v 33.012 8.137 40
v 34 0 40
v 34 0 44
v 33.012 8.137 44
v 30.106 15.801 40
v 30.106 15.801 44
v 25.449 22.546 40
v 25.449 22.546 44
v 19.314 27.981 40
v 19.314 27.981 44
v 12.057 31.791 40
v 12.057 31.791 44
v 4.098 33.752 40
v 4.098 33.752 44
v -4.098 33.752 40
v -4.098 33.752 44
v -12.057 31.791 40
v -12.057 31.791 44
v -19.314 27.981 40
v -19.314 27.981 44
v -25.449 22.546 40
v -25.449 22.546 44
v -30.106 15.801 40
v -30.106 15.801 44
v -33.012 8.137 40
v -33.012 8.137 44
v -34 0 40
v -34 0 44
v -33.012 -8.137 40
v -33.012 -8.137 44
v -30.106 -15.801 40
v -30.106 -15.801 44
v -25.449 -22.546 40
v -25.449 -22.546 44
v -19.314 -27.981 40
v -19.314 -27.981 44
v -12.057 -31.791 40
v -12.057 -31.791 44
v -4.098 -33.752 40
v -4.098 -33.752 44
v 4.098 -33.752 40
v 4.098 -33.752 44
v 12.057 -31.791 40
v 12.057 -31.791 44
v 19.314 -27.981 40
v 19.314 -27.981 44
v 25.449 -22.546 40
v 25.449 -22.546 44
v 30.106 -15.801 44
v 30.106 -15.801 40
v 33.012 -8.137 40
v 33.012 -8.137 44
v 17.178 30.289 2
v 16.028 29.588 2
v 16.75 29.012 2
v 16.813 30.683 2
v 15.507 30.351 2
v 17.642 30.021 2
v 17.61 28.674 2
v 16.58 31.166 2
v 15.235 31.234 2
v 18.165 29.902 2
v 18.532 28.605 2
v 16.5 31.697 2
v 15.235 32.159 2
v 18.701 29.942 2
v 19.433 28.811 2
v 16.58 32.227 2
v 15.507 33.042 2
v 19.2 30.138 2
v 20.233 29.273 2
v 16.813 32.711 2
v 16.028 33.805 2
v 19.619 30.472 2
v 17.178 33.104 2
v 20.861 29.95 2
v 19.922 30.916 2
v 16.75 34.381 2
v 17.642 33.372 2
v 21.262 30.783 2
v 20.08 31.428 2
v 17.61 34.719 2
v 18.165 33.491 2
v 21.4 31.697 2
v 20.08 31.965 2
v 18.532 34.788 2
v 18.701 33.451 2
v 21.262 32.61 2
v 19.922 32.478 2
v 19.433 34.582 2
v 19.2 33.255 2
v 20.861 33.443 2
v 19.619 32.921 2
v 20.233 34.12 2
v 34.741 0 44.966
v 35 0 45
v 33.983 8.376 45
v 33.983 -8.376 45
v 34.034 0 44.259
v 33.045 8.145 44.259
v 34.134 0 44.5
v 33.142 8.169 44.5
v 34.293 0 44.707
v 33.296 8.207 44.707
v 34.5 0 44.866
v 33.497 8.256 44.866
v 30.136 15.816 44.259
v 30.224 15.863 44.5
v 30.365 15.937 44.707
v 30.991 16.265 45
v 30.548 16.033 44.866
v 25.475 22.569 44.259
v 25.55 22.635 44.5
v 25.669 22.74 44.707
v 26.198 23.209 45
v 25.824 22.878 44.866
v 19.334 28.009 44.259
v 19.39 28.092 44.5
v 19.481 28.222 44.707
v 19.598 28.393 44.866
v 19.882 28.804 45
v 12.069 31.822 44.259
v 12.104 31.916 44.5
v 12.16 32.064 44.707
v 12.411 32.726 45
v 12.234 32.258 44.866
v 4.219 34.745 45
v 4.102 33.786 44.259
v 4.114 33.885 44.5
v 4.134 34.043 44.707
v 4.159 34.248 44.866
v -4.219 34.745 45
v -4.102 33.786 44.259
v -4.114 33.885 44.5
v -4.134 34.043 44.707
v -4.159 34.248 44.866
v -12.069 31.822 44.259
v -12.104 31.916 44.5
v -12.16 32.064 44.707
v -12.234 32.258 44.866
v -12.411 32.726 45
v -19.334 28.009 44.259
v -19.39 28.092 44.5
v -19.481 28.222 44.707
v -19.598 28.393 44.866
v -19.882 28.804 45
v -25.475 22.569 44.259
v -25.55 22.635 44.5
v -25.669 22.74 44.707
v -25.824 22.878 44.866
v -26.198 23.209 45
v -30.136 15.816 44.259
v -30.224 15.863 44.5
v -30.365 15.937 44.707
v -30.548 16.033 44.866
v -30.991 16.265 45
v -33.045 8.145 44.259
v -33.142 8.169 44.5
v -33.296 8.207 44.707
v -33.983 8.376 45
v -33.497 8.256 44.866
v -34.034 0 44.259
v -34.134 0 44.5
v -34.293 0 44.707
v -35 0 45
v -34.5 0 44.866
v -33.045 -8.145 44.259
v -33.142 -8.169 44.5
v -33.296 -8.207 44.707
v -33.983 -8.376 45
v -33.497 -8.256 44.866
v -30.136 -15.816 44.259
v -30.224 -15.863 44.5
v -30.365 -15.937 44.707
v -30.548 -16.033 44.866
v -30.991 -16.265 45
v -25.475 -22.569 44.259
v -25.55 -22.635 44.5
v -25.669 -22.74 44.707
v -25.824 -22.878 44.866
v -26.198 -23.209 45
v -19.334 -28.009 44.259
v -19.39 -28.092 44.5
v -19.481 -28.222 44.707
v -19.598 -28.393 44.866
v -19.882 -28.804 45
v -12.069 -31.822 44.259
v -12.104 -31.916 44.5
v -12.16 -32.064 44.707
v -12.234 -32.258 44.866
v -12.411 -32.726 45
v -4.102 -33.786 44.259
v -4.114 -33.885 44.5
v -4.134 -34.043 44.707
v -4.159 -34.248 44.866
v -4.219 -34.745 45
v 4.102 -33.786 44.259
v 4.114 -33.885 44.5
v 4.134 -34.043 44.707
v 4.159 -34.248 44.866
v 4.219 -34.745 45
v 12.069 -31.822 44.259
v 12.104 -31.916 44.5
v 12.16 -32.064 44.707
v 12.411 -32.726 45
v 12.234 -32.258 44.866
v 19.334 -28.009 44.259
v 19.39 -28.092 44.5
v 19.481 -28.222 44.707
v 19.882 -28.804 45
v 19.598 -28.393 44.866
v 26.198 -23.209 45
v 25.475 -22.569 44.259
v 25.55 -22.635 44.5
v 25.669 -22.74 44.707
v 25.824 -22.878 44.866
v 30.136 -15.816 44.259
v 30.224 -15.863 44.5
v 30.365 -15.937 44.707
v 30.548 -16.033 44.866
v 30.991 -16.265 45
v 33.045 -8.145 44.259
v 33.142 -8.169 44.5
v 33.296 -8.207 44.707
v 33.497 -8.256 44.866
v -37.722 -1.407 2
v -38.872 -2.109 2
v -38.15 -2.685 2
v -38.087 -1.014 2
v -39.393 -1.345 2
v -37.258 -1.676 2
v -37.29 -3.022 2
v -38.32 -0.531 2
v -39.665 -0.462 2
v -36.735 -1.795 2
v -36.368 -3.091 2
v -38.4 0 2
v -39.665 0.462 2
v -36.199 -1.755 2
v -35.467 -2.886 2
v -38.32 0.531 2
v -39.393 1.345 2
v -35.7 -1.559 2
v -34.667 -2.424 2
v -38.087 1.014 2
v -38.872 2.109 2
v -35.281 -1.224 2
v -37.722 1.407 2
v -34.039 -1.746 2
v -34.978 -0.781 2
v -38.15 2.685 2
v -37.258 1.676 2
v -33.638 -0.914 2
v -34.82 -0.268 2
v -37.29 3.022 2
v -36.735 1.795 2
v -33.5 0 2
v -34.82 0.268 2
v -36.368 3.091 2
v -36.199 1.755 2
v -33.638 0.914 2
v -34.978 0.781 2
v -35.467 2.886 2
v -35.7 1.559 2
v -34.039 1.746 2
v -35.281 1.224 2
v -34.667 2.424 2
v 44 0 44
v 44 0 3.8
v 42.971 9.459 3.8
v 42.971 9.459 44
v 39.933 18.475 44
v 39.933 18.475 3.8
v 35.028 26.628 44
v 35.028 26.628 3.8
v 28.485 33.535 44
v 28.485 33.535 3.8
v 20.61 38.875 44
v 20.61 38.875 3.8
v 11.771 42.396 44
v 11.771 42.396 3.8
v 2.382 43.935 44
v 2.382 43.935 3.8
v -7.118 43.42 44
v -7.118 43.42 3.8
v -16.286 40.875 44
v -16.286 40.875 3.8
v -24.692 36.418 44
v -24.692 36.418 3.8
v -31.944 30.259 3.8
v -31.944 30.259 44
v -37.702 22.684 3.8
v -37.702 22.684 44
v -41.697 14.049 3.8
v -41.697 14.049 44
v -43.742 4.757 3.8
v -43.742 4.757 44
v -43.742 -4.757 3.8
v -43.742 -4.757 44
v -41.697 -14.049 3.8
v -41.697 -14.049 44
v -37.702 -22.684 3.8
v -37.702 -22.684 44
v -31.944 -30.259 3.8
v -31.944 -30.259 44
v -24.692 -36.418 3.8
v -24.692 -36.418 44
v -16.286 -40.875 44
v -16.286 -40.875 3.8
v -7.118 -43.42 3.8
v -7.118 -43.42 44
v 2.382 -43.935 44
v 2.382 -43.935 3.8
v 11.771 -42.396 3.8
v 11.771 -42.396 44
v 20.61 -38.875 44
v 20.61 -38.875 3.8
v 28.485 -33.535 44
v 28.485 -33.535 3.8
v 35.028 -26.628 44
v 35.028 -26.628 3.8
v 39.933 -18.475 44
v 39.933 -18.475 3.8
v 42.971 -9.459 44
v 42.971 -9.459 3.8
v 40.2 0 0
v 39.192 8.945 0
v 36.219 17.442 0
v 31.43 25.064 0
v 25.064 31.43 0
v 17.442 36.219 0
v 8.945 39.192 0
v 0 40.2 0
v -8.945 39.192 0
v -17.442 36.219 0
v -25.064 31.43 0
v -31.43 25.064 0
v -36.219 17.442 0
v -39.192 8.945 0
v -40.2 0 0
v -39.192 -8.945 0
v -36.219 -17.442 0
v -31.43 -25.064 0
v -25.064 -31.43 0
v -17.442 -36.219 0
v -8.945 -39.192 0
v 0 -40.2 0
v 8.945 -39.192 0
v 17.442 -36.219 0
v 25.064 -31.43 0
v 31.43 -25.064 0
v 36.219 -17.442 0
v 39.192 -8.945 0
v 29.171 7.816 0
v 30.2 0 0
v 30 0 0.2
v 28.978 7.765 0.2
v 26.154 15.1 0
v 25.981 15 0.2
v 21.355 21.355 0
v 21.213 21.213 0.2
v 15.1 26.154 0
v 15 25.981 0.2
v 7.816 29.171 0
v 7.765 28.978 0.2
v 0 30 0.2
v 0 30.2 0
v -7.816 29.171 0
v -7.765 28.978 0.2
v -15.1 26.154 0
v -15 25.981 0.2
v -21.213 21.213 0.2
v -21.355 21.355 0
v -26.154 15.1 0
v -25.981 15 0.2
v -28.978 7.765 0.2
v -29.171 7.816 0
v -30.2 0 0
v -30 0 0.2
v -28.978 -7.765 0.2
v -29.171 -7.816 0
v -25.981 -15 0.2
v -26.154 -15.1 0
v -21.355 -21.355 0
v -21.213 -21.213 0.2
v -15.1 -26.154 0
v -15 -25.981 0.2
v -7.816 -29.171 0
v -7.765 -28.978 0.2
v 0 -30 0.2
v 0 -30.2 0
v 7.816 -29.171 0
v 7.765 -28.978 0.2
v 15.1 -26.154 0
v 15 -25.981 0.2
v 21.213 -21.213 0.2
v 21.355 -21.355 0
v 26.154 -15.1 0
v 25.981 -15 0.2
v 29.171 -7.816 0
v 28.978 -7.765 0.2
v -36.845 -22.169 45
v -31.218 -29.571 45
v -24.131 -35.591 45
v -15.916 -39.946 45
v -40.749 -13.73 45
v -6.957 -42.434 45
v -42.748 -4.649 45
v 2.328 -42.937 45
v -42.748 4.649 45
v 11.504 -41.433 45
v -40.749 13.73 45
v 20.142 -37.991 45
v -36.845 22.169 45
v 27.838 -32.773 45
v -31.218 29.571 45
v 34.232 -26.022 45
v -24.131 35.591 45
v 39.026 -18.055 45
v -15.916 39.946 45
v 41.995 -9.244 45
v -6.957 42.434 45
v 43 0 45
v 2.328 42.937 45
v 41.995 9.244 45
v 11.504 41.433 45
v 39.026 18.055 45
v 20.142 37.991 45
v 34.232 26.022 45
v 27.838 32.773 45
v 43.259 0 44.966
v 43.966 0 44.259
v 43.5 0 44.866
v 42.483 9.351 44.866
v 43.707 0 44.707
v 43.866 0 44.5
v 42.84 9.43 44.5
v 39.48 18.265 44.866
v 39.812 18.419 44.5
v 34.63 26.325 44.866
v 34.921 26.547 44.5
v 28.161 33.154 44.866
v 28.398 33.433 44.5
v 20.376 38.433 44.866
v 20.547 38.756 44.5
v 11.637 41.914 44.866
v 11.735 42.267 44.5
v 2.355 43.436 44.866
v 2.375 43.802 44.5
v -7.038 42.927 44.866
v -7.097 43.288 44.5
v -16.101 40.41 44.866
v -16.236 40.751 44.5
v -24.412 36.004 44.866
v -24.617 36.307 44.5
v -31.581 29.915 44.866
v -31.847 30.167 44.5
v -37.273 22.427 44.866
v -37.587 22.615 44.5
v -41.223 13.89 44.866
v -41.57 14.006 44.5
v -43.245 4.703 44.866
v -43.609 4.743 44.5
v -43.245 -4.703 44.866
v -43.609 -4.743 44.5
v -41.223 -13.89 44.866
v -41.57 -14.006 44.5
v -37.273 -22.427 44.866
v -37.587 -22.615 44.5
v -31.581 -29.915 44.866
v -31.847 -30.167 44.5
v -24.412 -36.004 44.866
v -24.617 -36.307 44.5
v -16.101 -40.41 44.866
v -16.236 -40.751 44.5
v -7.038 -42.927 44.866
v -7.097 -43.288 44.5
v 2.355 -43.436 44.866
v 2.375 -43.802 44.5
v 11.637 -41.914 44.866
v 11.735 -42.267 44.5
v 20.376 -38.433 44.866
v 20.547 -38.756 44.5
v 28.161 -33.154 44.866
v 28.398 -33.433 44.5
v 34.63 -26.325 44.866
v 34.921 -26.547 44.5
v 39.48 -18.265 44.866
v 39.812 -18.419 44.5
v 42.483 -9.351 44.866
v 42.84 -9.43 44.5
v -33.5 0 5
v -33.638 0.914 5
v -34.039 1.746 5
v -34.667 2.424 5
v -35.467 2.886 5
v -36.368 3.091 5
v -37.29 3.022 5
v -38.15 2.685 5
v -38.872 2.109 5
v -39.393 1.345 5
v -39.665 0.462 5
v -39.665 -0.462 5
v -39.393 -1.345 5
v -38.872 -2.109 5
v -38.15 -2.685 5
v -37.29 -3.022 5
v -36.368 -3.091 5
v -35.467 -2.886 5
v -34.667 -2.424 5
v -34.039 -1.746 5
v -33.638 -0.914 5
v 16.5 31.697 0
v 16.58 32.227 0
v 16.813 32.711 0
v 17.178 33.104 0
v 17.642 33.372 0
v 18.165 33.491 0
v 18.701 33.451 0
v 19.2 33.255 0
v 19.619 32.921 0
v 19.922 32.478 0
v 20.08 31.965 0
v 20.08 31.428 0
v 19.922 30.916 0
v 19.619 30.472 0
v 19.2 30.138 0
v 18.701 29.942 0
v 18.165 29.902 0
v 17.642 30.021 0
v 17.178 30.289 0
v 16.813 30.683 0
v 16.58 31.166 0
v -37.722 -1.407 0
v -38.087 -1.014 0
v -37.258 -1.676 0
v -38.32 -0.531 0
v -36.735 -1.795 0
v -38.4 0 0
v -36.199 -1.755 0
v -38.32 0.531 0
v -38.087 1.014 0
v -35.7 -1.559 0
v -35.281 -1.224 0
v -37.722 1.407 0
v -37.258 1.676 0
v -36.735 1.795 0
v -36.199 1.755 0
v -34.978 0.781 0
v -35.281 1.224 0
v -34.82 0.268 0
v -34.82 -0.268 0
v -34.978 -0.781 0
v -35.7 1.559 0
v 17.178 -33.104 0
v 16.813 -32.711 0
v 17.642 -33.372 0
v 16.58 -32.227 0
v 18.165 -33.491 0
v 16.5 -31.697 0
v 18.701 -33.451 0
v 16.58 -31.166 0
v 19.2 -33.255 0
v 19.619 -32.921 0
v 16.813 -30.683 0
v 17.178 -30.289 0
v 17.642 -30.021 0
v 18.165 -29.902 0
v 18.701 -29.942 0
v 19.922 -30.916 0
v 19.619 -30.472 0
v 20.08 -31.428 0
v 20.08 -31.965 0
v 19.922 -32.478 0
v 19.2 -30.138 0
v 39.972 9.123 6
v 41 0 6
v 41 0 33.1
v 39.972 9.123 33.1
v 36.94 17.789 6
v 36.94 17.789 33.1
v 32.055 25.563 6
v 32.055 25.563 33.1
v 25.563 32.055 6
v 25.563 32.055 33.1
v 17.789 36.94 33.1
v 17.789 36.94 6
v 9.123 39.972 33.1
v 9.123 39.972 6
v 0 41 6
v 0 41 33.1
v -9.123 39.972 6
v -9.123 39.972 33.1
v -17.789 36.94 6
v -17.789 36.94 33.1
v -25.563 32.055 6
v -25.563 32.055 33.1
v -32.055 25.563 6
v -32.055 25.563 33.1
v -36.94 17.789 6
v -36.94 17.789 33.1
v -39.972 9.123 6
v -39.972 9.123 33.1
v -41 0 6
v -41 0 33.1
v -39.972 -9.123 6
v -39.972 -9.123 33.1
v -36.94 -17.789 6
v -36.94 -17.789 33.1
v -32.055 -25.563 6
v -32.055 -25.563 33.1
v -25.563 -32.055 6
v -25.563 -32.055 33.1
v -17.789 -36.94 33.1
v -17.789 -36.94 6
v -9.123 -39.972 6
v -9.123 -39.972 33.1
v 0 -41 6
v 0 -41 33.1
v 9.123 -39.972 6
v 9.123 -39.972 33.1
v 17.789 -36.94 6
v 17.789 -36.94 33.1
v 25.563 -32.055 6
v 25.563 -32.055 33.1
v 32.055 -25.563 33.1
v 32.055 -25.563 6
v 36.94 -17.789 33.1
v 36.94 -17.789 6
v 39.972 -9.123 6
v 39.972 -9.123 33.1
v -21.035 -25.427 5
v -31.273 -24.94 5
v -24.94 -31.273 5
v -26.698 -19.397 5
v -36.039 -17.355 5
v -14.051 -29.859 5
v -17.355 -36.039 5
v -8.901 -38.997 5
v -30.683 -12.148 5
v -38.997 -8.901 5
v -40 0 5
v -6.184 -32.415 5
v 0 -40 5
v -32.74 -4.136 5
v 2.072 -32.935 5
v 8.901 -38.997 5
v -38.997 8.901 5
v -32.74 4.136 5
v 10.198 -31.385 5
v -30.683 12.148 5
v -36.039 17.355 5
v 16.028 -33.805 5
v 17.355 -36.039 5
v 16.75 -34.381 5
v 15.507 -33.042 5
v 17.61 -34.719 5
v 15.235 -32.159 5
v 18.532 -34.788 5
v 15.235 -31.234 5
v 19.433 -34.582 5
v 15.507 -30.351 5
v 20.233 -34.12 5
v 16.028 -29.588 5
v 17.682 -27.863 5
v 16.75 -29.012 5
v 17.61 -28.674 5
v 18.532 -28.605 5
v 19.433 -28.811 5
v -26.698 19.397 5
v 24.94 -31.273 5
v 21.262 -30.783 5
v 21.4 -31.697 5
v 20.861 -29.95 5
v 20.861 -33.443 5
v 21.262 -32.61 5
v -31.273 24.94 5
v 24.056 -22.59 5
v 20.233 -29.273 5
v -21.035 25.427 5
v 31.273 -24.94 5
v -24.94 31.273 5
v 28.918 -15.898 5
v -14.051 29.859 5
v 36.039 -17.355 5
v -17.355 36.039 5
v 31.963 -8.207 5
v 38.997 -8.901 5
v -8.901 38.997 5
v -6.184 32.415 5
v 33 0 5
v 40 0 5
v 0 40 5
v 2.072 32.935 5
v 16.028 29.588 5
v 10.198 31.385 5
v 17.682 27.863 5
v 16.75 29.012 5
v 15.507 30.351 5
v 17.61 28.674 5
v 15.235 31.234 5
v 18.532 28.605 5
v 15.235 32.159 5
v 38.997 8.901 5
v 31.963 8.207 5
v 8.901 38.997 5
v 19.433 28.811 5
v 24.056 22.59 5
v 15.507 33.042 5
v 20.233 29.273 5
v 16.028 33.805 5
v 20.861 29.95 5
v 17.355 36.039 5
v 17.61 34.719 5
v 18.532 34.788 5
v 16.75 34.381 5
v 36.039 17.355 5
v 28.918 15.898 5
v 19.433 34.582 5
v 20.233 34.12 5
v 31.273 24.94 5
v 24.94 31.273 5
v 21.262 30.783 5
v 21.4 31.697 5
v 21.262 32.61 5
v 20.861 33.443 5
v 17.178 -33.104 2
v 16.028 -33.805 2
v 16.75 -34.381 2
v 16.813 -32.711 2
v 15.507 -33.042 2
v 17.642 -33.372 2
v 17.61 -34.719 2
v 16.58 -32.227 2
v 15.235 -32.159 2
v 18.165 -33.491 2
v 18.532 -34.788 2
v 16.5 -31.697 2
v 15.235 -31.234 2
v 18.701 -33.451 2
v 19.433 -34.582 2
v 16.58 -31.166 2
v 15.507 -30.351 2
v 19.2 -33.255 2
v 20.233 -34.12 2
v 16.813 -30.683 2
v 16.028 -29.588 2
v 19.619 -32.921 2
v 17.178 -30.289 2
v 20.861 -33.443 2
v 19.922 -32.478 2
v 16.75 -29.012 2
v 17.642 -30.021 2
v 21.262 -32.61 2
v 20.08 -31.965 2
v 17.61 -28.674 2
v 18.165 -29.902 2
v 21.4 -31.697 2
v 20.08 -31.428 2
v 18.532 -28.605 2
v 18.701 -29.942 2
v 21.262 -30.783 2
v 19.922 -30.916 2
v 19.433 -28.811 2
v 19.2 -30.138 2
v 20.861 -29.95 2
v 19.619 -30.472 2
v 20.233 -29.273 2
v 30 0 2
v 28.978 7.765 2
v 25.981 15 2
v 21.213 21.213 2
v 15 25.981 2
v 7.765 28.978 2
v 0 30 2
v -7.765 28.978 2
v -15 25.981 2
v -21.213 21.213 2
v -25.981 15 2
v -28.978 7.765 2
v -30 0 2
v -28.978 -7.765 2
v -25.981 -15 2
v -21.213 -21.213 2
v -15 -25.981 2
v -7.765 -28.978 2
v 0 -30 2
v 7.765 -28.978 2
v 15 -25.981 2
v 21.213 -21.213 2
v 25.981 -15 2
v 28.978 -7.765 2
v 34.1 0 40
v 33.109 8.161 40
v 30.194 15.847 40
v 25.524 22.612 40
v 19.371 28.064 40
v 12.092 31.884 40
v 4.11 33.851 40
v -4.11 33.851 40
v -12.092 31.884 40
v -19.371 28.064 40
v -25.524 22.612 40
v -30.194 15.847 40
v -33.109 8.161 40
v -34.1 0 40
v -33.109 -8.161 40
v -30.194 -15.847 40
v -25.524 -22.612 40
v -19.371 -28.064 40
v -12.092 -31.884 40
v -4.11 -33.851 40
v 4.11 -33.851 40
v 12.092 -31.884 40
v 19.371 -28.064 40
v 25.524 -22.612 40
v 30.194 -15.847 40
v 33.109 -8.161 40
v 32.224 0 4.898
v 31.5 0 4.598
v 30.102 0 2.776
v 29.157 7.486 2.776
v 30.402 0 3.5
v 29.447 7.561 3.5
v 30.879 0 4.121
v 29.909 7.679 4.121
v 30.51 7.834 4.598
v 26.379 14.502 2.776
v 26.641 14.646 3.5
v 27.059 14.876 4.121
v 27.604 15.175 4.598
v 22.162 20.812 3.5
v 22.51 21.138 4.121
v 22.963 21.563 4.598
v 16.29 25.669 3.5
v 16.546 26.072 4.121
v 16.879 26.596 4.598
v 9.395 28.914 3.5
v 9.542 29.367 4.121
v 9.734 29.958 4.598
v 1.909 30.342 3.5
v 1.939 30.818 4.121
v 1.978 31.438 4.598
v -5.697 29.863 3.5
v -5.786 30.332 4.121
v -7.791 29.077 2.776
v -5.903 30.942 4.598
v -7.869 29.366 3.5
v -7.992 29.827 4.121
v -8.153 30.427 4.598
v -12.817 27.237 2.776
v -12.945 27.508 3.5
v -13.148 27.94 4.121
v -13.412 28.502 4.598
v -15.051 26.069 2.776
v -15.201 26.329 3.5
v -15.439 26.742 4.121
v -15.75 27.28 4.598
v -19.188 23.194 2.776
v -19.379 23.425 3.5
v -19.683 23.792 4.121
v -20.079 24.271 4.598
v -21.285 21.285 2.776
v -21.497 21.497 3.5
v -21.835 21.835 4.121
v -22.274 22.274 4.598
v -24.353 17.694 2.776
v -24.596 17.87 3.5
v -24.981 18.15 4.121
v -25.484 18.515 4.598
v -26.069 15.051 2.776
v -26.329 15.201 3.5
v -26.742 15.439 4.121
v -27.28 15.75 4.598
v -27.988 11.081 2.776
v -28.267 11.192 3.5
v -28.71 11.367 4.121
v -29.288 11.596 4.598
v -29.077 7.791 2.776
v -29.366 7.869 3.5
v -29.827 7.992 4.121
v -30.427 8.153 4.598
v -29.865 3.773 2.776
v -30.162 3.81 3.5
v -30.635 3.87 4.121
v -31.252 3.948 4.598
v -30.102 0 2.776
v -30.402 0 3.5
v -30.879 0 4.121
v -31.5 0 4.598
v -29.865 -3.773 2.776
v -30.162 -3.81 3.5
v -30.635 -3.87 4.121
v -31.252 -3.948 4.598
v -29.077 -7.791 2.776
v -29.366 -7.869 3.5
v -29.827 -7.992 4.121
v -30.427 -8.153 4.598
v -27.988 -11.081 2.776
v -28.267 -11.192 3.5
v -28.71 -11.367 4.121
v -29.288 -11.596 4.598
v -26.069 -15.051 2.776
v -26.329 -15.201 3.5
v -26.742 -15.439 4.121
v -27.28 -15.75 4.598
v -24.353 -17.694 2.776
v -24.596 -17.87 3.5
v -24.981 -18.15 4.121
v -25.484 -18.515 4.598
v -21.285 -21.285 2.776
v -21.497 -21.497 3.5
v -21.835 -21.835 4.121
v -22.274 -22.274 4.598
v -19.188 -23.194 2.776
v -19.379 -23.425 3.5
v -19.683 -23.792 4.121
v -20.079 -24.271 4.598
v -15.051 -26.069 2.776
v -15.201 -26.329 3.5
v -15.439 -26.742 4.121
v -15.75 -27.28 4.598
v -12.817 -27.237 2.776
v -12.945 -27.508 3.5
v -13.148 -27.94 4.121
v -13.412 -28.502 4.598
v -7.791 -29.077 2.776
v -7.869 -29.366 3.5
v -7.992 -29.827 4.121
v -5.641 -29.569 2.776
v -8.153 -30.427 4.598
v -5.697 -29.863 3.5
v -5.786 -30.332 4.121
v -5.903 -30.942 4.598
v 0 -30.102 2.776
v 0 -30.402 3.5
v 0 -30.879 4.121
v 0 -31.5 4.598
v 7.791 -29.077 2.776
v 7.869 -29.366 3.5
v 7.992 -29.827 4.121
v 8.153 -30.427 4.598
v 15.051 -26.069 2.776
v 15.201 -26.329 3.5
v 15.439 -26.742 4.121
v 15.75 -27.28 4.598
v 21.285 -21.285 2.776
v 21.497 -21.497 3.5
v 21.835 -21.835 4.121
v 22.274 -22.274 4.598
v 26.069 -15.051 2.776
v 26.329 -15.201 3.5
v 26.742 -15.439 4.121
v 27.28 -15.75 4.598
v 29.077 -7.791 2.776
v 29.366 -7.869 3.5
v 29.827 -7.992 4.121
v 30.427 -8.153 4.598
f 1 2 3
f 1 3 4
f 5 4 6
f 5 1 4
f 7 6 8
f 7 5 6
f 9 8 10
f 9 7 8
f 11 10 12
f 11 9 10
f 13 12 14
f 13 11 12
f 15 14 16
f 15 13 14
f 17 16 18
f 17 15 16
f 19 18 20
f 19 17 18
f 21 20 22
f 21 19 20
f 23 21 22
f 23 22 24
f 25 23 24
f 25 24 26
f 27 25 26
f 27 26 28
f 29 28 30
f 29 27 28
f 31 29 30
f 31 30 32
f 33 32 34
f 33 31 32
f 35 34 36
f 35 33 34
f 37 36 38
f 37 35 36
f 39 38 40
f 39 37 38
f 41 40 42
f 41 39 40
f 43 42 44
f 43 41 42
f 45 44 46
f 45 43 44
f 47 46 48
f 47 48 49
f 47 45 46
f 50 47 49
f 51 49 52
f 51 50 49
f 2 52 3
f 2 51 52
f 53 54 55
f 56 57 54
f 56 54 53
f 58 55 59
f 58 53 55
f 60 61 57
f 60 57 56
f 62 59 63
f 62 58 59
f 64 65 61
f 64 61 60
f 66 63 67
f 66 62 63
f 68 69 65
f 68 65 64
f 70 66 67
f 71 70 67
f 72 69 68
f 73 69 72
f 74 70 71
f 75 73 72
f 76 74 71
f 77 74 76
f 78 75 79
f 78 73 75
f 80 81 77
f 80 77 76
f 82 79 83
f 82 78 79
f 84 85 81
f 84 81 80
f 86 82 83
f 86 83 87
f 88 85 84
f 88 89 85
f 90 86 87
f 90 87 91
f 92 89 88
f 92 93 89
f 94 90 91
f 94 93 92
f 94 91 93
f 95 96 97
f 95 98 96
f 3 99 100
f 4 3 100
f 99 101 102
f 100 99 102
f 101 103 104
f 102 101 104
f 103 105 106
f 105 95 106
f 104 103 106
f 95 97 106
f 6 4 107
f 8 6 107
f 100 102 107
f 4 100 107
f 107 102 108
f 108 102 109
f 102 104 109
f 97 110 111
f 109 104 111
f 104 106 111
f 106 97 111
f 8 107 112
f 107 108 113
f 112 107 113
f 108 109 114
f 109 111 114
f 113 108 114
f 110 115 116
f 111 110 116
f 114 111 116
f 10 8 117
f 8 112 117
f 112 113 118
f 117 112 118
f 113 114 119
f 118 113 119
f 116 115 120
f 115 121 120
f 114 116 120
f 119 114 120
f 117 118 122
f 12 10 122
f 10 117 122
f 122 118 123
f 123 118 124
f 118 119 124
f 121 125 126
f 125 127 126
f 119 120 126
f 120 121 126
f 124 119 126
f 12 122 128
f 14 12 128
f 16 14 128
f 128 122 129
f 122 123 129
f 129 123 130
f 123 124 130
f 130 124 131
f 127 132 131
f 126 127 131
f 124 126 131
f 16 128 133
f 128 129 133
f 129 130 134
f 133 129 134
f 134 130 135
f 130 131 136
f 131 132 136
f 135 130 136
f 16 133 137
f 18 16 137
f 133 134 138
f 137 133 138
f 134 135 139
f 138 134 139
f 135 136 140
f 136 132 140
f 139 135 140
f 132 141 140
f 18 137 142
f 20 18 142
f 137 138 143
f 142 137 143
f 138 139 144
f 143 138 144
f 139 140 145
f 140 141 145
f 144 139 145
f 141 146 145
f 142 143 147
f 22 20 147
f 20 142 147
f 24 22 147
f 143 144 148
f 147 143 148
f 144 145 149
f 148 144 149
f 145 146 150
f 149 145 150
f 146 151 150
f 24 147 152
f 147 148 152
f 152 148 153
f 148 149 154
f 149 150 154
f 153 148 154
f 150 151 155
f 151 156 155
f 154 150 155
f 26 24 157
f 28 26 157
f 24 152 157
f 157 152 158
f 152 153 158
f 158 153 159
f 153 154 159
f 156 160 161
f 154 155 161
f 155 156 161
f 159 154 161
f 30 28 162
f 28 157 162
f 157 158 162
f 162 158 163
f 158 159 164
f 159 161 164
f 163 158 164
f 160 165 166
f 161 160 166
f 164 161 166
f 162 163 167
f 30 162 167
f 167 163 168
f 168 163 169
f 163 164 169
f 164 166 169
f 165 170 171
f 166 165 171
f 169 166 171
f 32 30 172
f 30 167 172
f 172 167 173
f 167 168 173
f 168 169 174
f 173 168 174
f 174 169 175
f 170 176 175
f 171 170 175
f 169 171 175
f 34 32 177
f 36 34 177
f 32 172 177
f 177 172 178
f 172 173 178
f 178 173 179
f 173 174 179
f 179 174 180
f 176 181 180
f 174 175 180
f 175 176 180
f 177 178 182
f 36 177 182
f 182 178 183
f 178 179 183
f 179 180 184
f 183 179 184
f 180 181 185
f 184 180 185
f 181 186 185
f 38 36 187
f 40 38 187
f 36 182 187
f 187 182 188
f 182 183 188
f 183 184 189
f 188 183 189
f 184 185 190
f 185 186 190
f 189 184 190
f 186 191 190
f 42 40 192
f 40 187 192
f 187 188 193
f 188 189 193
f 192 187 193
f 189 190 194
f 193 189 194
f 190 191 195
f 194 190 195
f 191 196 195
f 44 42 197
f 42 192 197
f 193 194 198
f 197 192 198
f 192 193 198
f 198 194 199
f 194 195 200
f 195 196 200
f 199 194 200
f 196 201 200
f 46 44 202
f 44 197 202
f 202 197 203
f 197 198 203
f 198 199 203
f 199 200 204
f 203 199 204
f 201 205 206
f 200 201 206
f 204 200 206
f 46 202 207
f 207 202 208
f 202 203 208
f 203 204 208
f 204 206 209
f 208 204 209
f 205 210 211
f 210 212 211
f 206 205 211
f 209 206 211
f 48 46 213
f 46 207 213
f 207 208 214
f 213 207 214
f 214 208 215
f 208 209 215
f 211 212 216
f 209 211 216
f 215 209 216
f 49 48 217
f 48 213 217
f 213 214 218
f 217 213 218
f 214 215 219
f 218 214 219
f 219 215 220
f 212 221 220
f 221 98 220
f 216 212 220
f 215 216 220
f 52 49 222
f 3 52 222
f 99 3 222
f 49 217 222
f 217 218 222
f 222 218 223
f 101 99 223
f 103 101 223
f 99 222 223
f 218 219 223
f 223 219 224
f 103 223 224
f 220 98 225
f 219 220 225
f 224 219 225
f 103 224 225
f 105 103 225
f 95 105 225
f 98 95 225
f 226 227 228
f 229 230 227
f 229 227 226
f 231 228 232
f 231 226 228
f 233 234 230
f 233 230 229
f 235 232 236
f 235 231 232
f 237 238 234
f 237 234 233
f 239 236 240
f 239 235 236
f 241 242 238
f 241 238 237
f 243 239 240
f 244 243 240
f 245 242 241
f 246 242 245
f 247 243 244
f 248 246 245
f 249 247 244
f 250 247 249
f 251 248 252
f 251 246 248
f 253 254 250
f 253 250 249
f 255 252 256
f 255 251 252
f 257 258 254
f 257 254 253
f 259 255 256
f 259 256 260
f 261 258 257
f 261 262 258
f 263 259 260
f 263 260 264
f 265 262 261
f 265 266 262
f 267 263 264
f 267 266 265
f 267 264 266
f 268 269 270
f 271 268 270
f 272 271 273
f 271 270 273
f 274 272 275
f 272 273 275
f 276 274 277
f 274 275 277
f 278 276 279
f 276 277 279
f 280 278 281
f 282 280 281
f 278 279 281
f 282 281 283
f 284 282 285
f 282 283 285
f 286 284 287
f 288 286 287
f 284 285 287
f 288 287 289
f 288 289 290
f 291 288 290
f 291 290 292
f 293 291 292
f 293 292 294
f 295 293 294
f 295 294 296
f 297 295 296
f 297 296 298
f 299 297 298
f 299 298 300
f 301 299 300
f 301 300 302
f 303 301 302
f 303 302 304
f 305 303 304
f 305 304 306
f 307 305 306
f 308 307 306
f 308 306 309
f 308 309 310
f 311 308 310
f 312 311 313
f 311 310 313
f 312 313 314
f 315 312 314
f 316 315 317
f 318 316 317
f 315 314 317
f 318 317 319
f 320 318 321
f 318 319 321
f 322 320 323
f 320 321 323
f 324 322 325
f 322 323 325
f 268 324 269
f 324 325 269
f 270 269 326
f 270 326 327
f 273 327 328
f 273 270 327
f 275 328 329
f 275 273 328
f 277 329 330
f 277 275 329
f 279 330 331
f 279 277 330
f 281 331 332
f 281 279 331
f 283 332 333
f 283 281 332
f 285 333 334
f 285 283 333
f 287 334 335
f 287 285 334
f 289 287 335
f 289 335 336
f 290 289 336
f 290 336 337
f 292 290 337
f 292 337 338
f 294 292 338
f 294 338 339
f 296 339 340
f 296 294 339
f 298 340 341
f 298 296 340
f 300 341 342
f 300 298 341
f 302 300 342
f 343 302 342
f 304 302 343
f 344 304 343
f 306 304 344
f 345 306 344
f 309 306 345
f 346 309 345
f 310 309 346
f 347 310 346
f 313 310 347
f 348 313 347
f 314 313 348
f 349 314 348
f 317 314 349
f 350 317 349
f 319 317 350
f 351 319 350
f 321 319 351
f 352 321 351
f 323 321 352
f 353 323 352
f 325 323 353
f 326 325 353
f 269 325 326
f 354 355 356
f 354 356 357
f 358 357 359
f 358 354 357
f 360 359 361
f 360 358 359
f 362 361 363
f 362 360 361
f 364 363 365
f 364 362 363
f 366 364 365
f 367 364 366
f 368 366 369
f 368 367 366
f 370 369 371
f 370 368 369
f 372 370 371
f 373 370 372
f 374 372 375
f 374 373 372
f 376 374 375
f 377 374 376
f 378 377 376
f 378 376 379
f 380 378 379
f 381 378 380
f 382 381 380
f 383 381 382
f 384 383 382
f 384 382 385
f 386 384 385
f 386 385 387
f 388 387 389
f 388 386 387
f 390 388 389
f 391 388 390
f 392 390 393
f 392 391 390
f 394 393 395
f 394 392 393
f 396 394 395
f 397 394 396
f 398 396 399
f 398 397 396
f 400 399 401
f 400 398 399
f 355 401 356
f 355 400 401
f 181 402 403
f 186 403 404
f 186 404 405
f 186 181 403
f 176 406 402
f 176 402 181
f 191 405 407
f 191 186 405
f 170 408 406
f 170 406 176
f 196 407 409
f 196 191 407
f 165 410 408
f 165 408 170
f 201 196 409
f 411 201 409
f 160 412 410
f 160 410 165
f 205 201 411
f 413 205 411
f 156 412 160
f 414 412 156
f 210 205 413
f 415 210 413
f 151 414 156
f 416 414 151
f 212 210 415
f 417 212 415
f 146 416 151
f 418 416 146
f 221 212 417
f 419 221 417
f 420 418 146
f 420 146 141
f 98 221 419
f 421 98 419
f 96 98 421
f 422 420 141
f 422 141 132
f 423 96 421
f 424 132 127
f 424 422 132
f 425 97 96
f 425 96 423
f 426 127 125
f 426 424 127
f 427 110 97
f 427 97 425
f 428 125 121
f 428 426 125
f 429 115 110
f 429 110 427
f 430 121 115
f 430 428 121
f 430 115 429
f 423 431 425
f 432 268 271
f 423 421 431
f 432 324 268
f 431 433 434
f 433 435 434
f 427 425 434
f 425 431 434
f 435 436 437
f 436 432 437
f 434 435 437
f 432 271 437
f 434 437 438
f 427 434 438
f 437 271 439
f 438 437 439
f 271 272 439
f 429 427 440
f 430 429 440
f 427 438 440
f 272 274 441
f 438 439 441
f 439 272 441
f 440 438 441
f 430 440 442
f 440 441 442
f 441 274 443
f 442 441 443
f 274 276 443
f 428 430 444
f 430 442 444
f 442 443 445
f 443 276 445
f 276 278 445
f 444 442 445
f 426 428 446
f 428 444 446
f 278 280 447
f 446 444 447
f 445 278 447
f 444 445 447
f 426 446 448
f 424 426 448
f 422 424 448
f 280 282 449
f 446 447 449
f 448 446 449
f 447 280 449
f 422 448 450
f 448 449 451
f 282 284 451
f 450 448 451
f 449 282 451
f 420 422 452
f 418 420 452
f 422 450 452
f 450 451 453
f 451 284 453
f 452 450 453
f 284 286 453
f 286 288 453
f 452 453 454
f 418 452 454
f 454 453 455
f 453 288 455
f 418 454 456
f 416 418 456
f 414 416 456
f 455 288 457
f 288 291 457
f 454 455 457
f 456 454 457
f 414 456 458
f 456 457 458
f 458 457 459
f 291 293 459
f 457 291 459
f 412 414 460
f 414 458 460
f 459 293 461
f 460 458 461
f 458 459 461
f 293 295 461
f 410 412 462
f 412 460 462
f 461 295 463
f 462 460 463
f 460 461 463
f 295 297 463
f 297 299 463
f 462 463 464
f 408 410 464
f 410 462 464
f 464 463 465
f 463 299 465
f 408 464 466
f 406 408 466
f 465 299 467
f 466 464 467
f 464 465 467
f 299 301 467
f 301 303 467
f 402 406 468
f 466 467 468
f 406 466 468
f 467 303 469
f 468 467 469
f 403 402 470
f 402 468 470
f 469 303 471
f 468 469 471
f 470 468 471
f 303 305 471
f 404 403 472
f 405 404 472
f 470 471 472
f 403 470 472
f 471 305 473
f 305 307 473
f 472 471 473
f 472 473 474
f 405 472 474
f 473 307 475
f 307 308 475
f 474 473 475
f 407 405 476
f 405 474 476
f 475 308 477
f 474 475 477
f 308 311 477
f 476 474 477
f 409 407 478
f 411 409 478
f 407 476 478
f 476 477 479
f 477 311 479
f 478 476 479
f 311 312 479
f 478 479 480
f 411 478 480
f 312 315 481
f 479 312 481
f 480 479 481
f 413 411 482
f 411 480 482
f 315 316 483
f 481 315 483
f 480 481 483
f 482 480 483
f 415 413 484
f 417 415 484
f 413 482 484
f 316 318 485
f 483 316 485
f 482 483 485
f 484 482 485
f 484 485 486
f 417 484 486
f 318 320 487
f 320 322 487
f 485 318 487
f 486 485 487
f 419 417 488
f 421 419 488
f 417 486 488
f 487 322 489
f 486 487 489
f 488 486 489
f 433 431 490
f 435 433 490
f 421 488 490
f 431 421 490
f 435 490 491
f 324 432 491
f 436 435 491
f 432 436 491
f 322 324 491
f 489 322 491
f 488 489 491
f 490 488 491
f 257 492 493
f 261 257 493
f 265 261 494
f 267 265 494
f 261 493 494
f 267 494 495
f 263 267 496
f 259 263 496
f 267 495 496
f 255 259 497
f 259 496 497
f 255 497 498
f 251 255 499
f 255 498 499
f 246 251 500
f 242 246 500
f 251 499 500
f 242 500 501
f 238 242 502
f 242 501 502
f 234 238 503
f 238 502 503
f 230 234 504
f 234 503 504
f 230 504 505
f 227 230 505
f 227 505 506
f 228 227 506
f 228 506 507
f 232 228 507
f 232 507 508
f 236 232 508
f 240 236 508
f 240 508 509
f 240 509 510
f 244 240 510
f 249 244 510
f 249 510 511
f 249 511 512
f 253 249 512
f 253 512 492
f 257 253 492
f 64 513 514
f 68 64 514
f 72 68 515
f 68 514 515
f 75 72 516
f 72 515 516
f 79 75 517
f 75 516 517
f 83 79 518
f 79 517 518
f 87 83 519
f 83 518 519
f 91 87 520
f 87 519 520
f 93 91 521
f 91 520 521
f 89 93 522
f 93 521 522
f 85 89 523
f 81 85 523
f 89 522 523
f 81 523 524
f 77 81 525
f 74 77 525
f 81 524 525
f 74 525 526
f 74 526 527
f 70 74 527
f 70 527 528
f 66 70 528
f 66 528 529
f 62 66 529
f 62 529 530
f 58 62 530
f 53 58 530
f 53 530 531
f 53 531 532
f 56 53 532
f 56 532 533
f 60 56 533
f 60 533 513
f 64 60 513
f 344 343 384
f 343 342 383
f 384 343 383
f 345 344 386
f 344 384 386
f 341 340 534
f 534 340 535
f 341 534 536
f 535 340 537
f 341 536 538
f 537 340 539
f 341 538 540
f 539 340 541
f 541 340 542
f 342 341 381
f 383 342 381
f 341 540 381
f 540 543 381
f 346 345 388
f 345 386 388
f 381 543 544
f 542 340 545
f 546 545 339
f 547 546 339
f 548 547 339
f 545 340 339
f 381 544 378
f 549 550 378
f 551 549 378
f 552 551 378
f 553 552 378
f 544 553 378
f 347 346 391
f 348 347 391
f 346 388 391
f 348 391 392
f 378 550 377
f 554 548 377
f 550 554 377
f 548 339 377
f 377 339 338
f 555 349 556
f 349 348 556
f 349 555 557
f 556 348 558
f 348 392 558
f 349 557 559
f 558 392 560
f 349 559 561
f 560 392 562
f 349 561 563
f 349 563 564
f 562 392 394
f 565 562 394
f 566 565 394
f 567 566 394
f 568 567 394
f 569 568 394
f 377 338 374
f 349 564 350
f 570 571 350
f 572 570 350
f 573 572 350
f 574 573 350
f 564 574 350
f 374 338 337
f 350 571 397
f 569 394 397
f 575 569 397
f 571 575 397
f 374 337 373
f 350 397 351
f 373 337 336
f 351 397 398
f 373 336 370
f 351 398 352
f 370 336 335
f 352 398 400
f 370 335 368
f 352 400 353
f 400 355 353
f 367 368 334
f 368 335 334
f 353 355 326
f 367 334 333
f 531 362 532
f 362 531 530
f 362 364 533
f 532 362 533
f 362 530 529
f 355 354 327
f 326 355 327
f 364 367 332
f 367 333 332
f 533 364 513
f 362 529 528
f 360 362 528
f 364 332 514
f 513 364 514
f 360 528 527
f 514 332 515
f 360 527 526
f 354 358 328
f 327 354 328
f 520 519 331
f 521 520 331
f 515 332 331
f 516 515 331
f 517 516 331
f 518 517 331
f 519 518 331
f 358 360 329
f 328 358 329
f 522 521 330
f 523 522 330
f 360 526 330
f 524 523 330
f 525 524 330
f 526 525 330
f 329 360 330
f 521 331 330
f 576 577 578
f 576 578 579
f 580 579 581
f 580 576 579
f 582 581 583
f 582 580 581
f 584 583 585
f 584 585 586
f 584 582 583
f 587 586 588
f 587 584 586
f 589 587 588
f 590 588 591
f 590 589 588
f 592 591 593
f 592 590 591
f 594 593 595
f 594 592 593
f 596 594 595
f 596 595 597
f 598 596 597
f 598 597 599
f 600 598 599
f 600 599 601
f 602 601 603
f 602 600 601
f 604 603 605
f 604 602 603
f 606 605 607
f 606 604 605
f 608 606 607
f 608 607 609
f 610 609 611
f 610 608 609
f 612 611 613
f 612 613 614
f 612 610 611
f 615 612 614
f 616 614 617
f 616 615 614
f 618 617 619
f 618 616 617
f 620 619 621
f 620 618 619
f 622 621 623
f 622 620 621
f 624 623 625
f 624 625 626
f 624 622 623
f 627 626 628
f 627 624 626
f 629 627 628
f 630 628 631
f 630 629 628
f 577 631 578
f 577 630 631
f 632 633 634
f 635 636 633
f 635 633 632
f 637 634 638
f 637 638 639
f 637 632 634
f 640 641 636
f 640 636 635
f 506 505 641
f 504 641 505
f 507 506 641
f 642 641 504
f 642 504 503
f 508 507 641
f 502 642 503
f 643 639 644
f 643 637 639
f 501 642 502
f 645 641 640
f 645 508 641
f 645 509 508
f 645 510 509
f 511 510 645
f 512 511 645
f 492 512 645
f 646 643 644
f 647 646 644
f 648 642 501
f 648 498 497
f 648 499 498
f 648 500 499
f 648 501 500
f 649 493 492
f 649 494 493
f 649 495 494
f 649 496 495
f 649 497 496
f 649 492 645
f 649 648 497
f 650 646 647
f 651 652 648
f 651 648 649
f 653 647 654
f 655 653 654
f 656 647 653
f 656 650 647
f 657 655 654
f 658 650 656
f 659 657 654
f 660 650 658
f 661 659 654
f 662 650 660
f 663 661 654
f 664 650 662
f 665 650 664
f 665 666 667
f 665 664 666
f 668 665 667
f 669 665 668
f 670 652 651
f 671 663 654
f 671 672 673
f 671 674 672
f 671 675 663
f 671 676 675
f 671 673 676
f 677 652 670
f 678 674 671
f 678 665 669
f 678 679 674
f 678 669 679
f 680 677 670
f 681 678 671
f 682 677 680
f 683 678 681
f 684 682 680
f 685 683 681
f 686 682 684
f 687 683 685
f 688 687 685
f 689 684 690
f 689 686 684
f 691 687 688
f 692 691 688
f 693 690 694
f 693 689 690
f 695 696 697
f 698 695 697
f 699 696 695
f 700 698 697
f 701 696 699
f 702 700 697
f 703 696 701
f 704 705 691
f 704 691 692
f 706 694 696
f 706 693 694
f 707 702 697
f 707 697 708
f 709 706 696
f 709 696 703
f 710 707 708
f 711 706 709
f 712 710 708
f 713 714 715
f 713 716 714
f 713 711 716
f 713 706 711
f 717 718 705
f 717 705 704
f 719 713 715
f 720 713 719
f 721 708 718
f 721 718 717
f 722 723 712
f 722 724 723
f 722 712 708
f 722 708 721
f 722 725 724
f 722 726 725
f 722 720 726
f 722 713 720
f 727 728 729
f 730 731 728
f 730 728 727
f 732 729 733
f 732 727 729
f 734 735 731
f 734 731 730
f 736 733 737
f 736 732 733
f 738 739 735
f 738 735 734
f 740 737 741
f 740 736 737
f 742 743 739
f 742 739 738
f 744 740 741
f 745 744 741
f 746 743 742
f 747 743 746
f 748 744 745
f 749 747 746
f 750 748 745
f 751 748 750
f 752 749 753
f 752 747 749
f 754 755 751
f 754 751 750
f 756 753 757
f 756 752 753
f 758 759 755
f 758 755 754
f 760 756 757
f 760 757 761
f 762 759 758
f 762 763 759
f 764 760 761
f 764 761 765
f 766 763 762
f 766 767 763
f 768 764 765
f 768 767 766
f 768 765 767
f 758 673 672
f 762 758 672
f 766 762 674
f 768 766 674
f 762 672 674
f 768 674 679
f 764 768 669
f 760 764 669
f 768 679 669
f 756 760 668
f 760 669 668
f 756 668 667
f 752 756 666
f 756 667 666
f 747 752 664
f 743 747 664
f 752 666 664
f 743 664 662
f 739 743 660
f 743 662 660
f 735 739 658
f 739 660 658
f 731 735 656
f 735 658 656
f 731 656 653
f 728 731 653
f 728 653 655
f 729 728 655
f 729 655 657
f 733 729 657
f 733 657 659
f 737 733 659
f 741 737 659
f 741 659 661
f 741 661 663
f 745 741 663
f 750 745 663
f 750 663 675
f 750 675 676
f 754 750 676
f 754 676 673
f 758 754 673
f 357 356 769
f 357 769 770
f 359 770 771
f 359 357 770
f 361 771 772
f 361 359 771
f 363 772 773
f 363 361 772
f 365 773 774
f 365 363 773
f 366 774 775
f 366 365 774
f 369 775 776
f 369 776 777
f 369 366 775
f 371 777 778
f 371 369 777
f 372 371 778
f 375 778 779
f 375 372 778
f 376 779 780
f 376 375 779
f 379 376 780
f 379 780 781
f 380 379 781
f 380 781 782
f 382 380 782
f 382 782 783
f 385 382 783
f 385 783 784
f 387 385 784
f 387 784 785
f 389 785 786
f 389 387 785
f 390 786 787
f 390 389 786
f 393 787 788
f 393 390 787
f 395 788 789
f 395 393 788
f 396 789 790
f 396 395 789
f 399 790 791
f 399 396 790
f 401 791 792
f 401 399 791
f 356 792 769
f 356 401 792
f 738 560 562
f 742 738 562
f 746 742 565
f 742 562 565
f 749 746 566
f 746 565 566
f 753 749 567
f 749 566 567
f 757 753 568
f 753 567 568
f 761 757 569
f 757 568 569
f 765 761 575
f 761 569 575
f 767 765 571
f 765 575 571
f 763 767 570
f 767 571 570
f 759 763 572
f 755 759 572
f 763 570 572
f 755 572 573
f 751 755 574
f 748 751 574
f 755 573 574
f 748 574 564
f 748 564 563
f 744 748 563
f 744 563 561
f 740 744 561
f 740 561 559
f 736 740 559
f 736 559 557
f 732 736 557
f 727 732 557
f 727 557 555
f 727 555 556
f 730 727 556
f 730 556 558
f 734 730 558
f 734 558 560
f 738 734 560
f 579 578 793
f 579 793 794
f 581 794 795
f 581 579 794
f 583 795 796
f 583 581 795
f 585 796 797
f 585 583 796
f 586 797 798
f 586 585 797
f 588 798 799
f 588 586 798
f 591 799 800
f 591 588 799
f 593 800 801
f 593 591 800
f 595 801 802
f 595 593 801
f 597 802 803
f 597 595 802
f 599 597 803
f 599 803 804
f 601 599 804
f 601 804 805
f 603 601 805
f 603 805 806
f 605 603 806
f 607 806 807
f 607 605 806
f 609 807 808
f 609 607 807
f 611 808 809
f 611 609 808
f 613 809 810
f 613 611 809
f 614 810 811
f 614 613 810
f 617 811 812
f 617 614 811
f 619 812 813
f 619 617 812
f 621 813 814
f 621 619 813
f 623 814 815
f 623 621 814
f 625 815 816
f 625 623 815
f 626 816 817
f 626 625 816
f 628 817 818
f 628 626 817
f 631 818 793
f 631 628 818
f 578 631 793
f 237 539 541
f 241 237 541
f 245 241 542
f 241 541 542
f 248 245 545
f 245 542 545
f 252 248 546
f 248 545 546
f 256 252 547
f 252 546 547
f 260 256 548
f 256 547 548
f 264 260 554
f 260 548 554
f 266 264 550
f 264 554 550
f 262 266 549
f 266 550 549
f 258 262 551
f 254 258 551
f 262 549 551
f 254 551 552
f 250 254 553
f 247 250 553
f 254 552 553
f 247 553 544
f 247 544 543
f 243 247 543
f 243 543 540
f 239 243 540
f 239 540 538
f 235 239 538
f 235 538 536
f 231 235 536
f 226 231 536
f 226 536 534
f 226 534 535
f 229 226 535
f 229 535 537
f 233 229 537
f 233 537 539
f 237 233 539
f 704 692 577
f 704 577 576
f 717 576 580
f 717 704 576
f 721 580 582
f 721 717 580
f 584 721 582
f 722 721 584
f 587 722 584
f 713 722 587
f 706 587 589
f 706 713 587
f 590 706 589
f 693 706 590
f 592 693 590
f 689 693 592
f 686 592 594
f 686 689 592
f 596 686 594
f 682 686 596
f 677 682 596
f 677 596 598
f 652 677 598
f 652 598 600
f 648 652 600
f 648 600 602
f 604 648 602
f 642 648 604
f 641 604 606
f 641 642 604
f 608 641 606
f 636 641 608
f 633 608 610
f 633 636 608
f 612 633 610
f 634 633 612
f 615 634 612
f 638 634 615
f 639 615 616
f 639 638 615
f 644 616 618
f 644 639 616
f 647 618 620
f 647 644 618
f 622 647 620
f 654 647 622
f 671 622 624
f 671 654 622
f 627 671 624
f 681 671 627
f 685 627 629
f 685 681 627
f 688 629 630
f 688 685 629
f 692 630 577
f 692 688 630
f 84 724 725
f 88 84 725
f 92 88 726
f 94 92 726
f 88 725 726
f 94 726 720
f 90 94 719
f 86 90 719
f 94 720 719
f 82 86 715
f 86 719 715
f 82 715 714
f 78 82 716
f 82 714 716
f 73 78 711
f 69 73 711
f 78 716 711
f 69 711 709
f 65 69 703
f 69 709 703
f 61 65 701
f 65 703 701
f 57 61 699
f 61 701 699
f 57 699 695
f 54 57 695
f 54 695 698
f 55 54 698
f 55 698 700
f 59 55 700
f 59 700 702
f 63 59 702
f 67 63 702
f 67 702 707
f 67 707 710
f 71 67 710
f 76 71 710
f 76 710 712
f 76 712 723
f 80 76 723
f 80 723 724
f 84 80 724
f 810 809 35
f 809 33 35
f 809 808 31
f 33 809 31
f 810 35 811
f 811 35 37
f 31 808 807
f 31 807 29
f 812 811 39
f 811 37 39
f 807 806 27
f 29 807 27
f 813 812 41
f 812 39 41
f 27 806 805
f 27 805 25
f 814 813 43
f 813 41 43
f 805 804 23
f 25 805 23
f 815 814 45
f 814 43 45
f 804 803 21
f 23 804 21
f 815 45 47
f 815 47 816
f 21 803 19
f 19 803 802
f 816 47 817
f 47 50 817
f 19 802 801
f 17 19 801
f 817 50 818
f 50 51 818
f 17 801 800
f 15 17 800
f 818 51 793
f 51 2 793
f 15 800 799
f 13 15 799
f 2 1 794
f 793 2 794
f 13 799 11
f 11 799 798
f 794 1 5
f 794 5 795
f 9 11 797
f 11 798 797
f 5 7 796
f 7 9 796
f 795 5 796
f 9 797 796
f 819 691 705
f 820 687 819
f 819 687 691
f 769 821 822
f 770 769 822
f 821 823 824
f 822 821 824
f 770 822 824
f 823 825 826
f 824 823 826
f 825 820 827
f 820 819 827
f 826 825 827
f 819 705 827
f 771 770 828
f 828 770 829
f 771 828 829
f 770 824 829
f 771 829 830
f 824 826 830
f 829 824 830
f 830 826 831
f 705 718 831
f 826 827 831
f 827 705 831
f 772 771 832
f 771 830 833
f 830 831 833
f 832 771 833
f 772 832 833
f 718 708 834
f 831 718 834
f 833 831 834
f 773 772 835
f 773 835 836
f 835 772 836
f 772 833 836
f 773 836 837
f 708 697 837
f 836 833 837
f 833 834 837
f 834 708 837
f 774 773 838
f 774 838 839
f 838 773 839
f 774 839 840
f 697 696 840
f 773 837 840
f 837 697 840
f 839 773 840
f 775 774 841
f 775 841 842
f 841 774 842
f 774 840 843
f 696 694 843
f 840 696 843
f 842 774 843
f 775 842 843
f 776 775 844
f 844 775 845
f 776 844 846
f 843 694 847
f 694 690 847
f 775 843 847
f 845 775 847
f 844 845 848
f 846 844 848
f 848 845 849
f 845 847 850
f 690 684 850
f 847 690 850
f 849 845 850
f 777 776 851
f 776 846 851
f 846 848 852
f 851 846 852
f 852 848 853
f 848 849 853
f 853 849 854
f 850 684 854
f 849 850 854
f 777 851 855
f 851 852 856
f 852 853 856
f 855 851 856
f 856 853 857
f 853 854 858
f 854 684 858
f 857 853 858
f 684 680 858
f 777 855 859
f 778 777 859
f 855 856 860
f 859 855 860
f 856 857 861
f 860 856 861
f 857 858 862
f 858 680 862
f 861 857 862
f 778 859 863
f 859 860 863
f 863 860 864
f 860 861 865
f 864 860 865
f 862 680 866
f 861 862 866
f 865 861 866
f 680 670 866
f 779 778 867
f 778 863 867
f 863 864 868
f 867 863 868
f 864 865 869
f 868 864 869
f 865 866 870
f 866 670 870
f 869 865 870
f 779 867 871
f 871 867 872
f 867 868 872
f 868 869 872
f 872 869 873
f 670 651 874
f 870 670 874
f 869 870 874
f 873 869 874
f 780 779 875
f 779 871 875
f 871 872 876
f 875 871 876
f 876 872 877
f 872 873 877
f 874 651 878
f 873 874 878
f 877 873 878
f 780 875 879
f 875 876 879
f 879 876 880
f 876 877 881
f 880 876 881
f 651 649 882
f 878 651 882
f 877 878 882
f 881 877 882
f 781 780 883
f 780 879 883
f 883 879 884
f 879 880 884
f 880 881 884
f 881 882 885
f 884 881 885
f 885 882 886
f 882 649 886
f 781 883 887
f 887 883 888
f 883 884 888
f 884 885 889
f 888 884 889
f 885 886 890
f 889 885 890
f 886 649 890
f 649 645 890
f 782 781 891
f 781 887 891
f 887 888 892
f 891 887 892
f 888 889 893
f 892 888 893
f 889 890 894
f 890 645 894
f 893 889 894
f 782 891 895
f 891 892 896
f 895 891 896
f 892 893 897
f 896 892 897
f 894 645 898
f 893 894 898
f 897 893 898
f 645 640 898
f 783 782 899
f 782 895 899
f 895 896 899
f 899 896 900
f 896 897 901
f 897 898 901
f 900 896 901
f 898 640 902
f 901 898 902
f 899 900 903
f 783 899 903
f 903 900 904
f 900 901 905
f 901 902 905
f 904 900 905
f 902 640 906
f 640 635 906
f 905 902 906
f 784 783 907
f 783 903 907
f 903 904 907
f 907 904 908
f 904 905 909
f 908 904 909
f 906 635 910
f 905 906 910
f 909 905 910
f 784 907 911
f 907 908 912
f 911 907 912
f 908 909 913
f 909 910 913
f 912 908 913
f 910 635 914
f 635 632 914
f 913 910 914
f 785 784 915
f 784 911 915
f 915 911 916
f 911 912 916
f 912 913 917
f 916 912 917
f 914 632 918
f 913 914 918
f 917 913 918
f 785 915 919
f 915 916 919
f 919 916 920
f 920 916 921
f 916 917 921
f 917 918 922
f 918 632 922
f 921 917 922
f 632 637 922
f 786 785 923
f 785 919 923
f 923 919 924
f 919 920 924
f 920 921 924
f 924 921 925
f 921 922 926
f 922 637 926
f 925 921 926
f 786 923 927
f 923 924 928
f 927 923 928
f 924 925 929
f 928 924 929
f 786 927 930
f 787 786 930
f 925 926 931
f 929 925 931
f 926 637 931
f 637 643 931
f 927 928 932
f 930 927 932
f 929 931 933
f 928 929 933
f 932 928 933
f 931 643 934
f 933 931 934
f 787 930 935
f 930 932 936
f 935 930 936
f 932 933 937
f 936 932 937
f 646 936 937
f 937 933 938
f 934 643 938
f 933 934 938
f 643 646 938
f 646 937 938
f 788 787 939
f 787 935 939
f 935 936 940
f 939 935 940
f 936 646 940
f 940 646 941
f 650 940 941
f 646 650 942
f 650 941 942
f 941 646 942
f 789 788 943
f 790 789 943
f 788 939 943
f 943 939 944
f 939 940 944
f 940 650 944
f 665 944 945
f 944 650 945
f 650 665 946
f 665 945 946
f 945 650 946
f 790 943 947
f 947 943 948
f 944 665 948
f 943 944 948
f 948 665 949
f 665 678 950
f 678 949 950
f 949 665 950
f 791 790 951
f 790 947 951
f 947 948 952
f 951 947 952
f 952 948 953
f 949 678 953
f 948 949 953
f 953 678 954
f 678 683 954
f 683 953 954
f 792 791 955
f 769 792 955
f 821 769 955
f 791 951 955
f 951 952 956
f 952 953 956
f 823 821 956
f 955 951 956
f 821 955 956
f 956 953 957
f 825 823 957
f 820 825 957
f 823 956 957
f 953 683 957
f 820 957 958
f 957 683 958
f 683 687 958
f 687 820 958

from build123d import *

# Parameters (mm, degrees)
SKETCH_R         = 44
SKETCH_R_2       = 30
PAD_DEPTH        = 5
SKETCH001_R      = 44
SKETCH001_R_2    = 41
PAD001_DEPTH     = 35
SKETCH002_R      = 44
SKETCH002_R_2    = 34
PAD002_DEPTH     = 5
HOLE_D           = 3.6
HOLE_DEPTH       = 5
HOLE_CBORE_D     = 6.2
HOLE_CBORE_DEPTH = 3
CHAMFER_SIZE     = 6.9
FILLET_R         = 1
CHAMFER001_SIZE  = 1
CHAMFER002_SIZE  = 3.8
FILLET001_R      = 3
CHAMFER003_SIZE  = 0.2


with BuildPart() as part:
    # Sketch → Pad (new body)
    with BuildSketch(Plane.XY):
        Circle(SKETCH_R)
        Circle(SKETCH_R_2, mode=Mode.SUBTRACT)
    extrude(amount=PAD_DEPTH)

    # Sketch001 (on DatumPlane) → Pad001 (join)
    with BuildSketch(Plane.XY.offset(5)):
        Circle(SKETCH001_R)
        Circle(SKETCH001_R_2, mode=Mode.SUBTRACT)
    extrude(amount=PAD001_DEPTH)

    # Sketch002 (on DatumPlane) → Pad002 (join)
    with BuildSketch(Plane.XY.offset(40)):
        Circle(SKETCH002_R)
        Circle(SKETCH002_R_2, mode=Mode.SUBTRACT)
    extrude(amount=PAD002_DEPTH)

    # Hole
    with Locations(Plane.XY.offset(5)):
        with Locations((-36.6, 0), (18.3, 31.69653), (18.3, -31.69653)):
            CounterBoreHole(HOLE_D / 2, HOLE_CBORE_D / 2, HOLE_CBORE_DEPTH, depth=HOLE_DEPTH)

    # Chamfer
    chamfer_edges = [part.edges().sort_by_distance(p)[0] for p in [
        (-41, 0, 40),
    ]]
    chamfer(chamfer_edges, length=CHAMFER_SIZE)

    # Fillet
    fillet_edges = [part.edges().sort_by_distance(p)[0] for p in [
        (-34, 0, 45),
        (-44, 0, 45),
    ]]
    fillet(fillet_edges, radius=FILLET_R)

    # Chamfer001
    chamfer001_edges = [part.edges().sort_by_distance(p)[0] for p in [
        (-41, 0, 5),
    ]]
    chamfer(chamfer001_edges, length=CHAMFER001_SIZE)

    # Chamfer002
    chamfer002_edges = [part.edges().sort_by_distance(p)[0] for p in [
        (-44, 0, 0),
    ]]
    chamfer(chamfer002_edges, length=CHAMFER002_SIZE)

    # Fillet001
    fillet001_edges = [part.edges().sort_by_distance(p)[0] for p in [
        (-30, 0, 5),
    ]]
    fillet(fillet001_edges, radius=FILLET001_R)

    # Chamfer003
    chamfer003_edges = [part.edges().sort_by_distance(p)[0] for p in [
        (-30, 0, 0),
    ]]
    chamfer(chamfer003_edges, length=CHAMFER003_SIZE)


solid = part.part
